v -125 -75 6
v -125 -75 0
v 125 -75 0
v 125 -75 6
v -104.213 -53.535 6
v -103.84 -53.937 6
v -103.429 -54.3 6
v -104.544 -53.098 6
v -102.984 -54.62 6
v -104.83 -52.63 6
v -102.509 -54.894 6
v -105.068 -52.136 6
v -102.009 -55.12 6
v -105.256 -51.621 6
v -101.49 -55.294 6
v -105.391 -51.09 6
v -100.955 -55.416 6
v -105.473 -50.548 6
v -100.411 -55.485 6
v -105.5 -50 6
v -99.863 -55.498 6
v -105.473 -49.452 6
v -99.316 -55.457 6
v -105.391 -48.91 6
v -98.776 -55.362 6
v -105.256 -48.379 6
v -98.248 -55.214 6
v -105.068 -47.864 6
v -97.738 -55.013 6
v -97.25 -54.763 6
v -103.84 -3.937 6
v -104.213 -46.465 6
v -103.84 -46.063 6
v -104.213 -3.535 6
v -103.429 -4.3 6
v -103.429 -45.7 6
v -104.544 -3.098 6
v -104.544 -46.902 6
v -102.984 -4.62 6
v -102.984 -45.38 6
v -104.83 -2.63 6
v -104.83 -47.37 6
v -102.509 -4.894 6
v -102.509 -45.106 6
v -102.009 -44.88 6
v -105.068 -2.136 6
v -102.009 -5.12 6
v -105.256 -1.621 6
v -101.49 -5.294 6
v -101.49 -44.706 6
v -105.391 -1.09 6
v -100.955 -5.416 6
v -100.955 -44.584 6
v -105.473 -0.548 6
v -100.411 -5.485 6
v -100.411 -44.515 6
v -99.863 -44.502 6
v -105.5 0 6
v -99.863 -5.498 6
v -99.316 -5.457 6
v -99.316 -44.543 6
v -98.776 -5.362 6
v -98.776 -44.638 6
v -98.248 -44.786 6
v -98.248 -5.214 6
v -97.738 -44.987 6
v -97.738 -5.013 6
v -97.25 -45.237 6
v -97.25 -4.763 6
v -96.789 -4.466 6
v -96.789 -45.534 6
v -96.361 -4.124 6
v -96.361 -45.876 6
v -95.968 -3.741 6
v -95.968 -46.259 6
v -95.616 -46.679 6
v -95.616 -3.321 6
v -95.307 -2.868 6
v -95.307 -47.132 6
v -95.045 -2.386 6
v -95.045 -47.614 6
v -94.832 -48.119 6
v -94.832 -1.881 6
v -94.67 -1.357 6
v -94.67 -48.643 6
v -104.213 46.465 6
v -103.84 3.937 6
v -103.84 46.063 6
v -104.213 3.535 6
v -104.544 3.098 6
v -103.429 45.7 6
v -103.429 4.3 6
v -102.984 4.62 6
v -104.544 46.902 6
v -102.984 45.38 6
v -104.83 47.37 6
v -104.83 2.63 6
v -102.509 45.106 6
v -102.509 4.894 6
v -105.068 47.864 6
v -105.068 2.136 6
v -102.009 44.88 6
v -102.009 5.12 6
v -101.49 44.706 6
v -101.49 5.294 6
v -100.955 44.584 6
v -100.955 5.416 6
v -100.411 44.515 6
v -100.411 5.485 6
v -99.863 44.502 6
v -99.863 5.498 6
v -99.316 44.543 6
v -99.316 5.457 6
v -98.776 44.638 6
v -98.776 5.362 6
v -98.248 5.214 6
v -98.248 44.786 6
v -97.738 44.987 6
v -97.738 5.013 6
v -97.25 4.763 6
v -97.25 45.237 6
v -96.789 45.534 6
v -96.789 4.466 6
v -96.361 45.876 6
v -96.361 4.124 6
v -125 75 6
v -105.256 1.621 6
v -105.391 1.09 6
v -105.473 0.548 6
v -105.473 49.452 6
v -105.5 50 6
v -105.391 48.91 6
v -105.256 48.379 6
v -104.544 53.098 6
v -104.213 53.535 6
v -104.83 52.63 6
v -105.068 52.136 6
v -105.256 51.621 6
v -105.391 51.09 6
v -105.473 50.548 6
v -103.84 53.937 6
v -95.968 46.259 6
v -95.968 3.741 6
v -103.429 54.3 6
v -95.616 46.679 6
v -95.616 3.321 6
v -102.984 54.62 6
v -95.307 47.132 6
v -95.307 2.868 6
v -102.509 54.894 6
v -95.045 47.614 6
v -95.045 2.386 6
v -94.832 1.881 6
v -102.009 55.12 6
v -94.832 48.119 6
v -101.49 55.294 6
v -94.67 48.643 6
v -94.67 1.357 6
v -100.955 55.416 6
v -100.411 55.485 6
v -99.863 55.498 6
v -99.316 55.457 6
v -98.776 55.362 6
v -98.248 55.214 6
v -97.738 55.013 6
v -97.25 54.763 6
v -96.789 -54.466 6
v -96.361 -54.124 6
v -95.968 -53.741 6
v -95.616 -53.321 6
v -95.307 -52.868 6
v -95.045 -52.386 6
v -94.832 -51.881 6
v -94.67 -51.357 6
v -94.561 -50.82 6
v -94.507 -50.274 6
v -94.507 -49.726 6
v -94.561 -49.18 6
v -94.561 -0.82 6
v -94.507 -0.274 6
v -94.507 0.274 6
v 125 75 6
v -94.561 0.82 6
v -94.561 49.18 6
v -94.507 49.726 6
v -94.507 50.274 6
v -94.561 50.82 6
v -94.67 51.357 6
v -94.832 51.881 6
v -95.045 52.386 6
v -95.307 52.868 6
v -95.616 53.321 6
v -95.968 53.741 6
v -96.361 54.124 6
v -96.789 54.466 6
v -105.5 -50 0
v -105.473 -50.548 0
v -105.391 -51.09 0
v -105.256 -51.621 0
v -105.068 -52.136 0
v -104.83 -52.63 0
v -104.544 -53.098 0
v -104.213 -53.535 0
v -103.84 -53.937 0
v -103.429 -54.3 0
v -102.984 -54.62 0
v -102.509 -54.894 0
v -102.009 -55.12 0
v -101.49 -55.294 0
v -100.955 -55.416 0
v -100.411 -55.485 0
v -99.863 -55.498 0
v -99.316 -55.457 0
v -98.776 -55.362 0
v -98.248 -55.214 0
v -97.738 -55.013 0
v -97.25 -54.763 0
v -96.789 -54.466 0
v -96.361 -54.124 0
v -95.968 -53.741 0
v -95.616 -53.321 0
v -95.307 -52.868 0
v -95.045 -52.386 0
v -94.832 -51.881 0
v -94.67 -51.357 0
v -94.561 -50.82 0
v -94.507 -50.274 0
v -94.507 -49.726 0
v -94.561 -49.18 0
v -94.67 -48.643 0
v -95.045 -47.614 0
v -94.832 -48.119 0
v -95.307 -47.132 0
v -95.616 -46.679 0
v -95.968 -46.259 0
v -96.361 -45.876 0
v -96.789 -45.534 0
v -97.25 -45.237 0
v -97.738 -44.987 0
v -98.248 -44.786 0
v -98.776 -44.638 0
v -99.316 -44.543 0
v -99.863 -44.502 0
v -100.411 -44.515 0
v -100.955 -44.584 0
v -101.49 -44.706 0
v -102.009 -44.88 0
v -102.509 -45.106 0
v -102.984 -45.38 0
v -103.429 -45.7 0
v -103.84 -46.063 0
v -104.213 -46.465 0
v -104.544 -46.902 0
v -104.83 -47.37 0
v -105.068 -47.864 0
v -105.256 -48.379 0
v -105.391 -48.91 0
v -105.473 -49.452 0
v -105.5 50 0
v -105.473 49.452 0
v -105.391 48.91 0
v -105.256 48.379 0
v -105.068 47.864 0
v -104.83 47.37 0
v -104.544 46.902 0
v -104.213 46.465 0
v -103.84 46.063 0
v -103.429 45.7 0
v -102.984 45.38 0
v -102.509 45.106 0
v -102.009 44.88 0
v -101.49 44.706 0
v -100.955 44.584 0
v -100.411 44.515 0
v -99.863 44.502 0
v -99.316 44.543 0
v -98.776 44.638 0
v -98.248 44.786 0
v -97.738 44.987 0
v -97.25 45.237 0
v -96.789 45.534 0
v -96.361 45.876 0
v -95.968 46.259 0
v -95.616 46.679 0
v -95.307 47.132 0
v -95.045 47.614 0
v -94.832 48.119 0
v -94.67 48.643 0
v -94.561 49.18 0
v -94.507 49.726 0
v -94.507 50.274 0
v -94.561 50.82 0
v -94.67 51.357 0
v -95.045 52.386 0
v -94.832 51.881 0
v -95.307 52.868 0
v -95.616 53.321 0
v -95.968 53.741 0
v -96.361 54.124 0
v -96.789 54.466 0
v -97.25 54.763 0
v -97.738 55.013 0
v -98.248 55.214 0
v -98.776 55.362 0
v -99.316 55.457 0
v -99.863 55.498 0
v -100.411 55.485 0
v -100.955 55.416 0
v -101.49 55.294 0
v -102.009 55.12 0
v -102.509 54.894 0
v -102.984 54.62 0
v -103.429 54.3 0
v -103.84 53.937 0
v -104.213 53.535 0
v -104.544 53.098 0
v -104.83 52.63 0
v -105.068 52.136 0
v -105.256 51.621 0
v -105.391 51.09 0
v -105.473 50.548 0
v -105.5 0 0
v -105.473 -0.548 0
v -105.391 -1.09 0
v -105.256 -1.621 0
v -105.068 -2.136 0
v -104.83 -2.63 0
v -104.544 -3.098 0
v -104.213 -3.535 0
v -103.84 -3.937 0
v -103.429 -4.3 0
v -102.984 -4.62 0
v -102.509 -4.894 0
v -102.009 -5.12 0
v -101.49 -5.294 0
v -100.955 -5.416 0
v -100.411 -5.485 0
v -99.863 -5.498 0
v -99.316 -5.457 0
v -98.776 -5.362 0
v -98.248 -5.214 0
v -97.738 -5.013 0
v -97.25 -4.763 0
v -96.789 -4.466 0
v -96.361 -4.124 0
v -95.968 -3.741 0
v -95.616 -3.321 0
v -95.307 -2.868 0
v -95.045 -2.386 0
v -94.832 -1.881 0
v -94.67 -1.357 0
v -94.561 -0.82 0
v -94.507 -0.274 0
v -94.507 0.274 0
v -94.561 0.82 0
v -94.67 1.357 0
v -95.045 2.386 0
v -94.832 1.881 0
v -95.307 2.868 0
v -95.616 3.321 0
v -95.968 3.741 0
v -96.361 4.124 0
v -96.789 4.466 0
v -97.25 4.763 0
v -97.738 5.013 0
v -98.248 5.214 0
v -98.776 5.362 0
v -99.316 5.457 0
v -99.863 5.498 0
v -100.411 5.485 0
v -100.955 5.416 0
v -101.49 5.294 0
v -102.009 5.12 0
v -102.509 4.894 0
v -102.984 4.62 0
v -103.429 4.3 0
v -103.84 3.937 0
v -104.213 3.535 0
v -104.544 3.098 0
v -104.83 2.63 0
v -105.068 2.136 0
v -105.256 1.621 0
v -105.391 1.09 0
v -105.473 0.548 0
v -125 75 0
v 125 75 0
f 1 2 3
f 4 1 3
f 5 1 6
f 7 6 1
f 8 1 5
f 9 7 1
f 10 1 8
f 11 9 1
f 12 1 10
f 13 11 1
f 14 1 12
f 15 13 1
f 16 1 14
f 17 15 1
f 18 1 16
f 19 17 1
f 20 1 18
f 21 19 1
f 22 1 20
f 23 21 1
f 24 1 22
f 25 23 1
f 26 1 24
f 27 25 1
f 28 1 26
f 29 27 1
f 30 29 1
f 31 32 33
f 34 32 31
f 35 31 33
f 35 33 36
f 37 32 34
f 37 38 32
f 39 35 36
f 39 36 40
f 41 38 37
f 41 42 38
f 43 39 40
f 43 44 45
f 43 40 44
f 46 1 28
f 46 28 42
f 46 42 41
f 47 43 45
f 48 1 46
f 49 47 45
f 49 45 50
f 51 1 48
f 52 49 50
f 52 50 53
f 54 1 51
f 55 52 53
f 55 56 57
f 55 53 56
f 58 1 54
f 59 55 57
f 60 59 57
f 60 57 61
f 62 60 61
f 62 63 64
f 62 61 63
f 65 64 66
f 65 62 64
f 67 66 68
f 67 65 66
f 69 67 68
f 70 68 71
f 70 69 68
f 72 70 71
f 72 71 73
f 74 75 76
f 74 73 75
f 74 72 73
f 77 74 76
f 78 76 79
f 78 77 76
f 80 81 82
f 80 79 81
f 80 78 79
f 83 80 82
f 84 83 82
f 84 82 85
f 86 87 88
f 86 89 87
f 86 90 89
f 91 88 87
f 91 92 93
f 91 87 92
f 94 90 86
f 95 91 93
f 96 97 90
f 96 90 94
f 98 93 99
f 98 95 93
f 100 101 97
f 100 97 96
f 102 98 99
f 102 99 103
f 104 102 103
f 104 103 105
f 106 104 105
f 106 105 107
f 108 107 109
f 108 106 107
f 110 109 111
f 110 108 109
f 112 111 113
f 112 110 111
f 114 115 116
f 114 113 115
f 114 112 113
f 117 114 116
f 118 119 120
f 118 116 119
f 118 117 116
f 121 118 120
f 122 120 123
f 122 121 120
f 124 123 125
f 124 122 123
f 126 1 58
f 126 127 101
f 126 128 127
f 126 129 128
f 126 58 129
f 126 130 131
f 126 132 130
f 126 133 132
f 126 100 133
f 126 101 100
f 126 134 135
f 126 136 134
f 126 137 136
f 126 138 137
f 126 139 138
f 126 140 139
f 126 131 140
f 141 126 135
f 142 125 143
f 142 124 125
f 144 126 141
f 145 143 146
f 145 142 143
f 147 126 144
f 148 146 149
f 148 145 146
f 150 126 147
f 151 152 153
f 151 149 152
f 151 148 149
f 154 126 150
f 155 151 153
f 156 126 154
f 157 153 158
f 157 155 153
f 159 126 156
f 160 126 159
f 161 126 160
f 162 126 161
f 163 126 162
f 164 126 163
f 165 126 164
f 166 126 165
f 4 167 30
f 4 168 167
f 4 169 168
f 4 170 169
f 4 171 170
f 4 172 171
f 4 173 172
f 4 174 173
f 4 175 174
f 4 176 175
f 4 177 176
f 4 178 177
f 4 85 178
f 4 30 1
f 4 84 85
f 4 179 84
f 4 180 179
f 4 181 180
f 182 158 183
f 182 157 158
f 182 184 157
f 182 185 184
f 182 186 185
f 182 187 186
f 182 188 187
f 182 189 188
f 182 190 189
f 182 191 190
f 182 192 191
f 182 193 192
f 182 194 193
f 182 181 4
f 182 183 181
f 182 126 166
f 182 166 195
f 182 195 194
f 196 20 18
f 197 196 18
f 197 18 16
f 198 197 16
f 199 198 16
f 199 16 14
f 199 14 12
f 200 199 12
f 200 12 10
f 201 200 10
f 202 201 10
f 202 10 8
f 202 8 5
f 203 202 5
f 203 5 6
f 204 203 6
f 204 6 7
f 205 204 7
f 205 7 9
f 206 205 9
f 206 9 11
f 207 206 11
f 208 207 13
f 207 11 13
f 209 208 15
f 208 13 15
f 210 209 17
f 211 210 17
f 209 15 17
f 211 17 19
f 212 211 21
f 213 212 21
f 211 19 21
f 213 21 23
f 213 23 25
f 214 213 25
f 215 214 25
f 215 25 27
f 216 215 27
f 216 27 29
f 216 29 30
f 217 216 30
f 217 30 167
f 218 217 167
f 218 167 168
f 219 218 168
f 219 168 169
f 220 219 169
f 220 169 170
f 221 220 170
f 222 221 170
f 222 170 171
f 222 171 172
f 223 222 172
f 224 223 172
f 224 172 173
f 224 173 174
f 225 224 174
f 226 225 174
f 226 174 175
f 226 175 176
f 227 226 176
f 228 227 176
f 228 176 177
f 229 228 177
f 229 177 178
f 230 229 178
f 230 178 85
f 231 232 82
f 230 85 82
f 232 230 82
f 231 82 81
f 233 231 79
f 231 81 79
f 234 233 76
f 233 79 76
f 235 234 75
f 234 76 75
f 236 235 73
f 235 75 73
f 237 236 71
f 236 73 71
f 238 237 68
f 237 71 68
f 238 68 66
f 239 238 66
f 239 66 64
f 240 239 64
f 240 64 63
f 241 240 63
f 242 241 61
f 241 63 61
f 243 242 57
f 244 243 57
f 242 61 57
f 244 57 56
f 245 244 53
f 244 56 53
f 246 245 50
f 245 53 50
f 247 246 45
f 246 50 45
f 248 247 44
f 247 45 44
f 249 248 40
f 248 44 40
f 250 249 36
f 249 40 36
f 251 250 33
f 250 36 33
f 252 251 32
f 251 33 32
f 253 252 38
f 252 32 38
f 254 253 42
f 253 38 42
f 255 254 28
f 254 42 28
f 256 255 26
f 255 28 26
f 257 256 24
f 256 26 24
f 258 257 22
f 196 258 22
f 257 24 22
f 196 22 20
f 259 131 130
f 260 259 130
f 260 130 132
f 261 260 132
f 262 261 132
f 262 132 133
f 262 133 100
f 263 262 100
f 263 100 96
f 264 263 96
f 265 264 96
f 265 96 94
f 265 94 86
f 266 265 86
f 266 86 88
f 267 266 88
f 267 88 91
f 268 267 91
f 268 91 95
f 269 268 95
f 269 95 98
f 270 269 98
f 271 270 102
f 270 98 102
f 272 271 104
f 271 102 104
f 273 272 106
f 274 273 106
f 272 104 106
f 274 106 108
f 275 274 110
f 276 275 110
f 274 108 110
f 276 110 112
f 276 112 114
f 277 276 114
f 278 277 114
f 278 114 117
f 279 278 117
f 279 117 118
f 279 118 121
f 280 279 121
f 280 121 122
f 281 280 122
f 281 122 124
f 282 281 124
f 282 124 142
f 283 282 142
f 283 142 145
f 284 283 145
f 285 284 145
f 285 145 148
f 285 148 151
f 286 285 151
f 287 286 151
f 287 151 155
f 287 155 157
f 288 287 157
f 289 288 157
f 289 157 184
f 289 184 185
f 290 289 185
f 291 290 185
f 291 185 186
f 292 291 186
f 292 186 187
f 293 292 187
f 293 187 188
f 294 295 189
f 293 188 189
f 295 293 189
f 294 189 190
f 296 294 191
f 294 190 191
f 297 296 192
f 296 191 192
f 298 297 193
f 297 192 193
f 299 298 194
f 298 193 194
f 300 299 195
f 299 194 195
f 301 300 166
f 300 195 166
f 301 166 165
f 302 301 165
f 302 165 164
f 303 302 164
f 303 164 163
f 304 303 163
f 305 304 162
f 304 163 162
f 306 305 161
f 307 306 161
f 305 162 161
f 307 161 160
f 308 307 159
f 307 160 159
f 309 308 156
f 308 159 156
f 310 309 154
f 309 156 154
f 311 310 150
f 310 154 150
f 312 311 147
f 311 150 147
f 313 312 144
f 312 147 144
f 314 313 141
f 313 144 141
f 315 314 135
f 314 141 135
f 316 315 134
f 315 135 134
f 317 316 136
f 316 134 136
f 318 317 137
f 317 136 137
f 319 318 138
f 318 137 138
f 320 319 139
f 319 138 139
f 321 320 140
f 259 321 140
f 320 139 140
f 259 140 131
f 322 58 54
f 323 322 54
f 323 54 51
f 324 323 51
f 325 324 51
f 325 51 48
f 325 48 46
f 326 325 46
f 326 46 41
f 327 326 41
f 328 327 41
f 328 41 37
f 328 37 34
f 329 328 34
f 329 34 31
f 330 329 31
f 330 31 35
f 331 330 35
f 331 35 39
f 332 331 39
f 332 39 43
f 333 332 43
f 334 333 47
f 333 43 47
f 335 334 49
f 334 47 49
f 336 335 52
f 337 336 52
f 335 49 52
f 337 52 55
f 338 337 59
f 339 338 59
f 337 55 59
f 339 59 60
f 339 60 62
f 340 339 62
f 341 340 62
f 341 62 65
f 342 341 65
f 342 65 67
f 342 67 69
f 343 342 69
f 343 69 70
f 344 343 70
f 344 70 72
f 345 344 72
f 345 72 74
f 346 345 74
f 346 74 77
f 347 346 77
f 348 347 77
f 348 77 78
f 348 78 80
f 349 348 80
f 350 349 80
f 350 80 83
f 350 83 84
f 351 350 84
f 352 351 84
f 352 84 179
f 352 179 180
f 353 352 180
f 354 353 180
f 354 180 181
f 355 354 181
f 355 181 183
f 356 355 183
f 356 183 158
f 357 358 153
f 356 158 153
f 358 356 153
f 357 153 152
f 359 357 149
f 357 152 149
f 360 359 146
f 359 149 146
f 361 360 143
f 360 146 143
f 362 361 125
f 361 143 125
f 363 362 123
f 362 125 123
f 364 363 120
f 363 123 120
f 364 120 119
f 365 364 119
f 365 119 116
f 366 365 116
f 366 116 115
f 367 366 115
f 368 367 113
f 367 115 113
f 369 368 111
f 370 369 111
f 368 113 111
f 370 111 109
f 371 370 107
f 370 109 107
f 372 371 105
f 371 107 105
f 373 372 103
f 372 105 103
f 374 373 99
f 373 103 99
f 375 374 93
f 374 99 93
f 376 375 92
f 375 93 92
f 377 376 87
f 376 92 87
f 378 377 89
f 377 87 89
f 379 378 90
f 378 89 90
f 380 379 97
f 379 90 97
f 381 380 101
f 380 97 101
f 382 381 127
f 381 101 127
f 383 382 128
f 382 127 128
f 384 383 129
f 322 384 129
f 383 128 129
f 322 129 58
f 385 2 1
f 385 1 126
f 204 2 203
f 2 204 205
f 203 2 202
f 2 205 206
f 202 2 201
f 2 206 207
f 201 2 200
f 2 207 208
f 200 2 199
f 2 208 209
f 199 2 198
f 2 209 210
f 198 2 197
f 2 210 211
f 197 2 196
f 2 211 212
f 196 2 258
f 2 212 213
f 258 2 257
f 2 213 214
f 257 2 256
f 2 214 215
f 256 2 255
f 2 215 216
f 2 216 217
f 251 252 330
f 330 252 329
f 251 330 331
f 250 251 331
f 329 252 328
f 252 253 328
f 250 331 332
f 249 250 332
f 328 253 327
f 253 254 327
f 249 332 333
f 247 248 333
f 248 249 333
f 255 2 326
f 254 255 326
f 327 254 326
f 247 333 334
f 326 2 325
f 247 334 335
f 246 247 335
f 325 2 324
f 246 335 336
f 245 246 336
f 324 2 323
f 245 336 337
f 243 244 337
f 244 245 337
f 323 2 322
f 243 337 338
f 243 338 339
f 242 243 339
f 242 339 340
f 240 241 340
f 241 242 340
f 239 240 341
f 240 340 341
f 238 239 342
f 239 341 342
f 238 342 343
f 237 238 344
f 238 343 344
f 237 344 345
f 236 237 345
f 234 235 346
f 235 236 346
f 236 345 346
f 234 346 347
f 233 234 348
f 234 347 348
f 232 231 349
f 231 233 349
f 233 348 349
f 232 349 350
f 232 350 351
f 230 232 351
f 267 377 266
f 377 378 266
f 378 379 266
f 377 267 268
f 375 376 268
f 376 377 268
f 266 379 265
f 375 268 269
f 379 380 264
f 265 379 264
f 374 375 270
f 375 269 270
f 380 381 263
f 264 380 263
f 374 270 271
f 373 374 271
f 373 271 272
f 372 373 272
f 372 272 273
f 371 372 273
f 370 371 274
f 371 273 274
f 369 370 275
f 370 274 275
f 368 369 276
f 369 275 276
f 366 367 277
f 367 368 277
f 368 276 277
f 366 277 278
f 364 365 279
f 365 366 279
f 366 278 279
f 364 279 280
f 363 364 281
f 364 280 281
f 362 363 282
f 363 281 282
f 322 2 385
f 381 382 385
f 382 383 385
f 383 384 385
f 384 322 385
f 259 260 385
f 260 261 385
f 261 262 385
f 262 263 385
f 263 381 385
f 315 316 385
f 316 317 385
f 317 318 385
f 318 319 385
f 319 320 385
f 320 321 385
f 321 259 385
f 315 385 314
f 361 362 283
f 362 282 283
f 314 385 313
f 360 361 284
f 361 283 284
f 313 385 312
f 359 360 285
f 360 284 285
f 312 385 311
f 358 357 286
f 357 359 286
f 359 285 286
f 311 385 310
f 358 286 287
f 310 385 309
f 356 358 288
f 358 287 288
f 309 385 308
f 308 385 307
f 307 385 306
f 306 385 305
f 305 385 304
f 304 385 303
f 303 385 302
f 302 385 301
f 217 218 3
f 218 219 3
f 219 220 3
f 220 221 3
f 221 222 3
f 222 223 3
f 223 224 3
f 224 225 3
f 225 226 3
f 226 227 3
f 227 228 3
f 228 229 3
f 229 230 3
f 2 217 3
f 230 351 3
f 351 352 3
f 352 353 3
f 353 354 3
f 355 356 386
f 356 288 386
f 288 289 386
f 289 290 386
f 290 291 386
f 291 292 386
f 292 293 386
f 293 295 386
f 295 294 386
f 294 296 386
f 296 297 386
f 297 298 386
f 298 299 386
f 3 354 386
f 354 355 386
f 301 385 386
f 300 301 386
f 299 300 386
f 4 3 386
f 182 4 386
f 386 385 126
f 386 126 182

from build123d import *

# Parameters (mm, degrees)
F0_W     = 250
F0_H     = 150
F1_DEPTH = 6
F2_D     = 11
F2_DEPTH = 6


with BuildPart() as f1:
    # F0 (on Top) → F1 (new body)
    with BuildSketch(Plane.XY):
        Rectangle(F0_W, F0_H)
    extrude(amount=F1_DEPTH)

    # F2
    with Locations(Plane(origin=(0, 0, 0), x_dir=(1, 0, 0), z_dir=(0, 0, -1))):
        with Locations((-100, 50), (-100, 0), (-100, -50)):
            Hole(F2_D / 2, depth=F2_DEPTH)


solid = f1.part
